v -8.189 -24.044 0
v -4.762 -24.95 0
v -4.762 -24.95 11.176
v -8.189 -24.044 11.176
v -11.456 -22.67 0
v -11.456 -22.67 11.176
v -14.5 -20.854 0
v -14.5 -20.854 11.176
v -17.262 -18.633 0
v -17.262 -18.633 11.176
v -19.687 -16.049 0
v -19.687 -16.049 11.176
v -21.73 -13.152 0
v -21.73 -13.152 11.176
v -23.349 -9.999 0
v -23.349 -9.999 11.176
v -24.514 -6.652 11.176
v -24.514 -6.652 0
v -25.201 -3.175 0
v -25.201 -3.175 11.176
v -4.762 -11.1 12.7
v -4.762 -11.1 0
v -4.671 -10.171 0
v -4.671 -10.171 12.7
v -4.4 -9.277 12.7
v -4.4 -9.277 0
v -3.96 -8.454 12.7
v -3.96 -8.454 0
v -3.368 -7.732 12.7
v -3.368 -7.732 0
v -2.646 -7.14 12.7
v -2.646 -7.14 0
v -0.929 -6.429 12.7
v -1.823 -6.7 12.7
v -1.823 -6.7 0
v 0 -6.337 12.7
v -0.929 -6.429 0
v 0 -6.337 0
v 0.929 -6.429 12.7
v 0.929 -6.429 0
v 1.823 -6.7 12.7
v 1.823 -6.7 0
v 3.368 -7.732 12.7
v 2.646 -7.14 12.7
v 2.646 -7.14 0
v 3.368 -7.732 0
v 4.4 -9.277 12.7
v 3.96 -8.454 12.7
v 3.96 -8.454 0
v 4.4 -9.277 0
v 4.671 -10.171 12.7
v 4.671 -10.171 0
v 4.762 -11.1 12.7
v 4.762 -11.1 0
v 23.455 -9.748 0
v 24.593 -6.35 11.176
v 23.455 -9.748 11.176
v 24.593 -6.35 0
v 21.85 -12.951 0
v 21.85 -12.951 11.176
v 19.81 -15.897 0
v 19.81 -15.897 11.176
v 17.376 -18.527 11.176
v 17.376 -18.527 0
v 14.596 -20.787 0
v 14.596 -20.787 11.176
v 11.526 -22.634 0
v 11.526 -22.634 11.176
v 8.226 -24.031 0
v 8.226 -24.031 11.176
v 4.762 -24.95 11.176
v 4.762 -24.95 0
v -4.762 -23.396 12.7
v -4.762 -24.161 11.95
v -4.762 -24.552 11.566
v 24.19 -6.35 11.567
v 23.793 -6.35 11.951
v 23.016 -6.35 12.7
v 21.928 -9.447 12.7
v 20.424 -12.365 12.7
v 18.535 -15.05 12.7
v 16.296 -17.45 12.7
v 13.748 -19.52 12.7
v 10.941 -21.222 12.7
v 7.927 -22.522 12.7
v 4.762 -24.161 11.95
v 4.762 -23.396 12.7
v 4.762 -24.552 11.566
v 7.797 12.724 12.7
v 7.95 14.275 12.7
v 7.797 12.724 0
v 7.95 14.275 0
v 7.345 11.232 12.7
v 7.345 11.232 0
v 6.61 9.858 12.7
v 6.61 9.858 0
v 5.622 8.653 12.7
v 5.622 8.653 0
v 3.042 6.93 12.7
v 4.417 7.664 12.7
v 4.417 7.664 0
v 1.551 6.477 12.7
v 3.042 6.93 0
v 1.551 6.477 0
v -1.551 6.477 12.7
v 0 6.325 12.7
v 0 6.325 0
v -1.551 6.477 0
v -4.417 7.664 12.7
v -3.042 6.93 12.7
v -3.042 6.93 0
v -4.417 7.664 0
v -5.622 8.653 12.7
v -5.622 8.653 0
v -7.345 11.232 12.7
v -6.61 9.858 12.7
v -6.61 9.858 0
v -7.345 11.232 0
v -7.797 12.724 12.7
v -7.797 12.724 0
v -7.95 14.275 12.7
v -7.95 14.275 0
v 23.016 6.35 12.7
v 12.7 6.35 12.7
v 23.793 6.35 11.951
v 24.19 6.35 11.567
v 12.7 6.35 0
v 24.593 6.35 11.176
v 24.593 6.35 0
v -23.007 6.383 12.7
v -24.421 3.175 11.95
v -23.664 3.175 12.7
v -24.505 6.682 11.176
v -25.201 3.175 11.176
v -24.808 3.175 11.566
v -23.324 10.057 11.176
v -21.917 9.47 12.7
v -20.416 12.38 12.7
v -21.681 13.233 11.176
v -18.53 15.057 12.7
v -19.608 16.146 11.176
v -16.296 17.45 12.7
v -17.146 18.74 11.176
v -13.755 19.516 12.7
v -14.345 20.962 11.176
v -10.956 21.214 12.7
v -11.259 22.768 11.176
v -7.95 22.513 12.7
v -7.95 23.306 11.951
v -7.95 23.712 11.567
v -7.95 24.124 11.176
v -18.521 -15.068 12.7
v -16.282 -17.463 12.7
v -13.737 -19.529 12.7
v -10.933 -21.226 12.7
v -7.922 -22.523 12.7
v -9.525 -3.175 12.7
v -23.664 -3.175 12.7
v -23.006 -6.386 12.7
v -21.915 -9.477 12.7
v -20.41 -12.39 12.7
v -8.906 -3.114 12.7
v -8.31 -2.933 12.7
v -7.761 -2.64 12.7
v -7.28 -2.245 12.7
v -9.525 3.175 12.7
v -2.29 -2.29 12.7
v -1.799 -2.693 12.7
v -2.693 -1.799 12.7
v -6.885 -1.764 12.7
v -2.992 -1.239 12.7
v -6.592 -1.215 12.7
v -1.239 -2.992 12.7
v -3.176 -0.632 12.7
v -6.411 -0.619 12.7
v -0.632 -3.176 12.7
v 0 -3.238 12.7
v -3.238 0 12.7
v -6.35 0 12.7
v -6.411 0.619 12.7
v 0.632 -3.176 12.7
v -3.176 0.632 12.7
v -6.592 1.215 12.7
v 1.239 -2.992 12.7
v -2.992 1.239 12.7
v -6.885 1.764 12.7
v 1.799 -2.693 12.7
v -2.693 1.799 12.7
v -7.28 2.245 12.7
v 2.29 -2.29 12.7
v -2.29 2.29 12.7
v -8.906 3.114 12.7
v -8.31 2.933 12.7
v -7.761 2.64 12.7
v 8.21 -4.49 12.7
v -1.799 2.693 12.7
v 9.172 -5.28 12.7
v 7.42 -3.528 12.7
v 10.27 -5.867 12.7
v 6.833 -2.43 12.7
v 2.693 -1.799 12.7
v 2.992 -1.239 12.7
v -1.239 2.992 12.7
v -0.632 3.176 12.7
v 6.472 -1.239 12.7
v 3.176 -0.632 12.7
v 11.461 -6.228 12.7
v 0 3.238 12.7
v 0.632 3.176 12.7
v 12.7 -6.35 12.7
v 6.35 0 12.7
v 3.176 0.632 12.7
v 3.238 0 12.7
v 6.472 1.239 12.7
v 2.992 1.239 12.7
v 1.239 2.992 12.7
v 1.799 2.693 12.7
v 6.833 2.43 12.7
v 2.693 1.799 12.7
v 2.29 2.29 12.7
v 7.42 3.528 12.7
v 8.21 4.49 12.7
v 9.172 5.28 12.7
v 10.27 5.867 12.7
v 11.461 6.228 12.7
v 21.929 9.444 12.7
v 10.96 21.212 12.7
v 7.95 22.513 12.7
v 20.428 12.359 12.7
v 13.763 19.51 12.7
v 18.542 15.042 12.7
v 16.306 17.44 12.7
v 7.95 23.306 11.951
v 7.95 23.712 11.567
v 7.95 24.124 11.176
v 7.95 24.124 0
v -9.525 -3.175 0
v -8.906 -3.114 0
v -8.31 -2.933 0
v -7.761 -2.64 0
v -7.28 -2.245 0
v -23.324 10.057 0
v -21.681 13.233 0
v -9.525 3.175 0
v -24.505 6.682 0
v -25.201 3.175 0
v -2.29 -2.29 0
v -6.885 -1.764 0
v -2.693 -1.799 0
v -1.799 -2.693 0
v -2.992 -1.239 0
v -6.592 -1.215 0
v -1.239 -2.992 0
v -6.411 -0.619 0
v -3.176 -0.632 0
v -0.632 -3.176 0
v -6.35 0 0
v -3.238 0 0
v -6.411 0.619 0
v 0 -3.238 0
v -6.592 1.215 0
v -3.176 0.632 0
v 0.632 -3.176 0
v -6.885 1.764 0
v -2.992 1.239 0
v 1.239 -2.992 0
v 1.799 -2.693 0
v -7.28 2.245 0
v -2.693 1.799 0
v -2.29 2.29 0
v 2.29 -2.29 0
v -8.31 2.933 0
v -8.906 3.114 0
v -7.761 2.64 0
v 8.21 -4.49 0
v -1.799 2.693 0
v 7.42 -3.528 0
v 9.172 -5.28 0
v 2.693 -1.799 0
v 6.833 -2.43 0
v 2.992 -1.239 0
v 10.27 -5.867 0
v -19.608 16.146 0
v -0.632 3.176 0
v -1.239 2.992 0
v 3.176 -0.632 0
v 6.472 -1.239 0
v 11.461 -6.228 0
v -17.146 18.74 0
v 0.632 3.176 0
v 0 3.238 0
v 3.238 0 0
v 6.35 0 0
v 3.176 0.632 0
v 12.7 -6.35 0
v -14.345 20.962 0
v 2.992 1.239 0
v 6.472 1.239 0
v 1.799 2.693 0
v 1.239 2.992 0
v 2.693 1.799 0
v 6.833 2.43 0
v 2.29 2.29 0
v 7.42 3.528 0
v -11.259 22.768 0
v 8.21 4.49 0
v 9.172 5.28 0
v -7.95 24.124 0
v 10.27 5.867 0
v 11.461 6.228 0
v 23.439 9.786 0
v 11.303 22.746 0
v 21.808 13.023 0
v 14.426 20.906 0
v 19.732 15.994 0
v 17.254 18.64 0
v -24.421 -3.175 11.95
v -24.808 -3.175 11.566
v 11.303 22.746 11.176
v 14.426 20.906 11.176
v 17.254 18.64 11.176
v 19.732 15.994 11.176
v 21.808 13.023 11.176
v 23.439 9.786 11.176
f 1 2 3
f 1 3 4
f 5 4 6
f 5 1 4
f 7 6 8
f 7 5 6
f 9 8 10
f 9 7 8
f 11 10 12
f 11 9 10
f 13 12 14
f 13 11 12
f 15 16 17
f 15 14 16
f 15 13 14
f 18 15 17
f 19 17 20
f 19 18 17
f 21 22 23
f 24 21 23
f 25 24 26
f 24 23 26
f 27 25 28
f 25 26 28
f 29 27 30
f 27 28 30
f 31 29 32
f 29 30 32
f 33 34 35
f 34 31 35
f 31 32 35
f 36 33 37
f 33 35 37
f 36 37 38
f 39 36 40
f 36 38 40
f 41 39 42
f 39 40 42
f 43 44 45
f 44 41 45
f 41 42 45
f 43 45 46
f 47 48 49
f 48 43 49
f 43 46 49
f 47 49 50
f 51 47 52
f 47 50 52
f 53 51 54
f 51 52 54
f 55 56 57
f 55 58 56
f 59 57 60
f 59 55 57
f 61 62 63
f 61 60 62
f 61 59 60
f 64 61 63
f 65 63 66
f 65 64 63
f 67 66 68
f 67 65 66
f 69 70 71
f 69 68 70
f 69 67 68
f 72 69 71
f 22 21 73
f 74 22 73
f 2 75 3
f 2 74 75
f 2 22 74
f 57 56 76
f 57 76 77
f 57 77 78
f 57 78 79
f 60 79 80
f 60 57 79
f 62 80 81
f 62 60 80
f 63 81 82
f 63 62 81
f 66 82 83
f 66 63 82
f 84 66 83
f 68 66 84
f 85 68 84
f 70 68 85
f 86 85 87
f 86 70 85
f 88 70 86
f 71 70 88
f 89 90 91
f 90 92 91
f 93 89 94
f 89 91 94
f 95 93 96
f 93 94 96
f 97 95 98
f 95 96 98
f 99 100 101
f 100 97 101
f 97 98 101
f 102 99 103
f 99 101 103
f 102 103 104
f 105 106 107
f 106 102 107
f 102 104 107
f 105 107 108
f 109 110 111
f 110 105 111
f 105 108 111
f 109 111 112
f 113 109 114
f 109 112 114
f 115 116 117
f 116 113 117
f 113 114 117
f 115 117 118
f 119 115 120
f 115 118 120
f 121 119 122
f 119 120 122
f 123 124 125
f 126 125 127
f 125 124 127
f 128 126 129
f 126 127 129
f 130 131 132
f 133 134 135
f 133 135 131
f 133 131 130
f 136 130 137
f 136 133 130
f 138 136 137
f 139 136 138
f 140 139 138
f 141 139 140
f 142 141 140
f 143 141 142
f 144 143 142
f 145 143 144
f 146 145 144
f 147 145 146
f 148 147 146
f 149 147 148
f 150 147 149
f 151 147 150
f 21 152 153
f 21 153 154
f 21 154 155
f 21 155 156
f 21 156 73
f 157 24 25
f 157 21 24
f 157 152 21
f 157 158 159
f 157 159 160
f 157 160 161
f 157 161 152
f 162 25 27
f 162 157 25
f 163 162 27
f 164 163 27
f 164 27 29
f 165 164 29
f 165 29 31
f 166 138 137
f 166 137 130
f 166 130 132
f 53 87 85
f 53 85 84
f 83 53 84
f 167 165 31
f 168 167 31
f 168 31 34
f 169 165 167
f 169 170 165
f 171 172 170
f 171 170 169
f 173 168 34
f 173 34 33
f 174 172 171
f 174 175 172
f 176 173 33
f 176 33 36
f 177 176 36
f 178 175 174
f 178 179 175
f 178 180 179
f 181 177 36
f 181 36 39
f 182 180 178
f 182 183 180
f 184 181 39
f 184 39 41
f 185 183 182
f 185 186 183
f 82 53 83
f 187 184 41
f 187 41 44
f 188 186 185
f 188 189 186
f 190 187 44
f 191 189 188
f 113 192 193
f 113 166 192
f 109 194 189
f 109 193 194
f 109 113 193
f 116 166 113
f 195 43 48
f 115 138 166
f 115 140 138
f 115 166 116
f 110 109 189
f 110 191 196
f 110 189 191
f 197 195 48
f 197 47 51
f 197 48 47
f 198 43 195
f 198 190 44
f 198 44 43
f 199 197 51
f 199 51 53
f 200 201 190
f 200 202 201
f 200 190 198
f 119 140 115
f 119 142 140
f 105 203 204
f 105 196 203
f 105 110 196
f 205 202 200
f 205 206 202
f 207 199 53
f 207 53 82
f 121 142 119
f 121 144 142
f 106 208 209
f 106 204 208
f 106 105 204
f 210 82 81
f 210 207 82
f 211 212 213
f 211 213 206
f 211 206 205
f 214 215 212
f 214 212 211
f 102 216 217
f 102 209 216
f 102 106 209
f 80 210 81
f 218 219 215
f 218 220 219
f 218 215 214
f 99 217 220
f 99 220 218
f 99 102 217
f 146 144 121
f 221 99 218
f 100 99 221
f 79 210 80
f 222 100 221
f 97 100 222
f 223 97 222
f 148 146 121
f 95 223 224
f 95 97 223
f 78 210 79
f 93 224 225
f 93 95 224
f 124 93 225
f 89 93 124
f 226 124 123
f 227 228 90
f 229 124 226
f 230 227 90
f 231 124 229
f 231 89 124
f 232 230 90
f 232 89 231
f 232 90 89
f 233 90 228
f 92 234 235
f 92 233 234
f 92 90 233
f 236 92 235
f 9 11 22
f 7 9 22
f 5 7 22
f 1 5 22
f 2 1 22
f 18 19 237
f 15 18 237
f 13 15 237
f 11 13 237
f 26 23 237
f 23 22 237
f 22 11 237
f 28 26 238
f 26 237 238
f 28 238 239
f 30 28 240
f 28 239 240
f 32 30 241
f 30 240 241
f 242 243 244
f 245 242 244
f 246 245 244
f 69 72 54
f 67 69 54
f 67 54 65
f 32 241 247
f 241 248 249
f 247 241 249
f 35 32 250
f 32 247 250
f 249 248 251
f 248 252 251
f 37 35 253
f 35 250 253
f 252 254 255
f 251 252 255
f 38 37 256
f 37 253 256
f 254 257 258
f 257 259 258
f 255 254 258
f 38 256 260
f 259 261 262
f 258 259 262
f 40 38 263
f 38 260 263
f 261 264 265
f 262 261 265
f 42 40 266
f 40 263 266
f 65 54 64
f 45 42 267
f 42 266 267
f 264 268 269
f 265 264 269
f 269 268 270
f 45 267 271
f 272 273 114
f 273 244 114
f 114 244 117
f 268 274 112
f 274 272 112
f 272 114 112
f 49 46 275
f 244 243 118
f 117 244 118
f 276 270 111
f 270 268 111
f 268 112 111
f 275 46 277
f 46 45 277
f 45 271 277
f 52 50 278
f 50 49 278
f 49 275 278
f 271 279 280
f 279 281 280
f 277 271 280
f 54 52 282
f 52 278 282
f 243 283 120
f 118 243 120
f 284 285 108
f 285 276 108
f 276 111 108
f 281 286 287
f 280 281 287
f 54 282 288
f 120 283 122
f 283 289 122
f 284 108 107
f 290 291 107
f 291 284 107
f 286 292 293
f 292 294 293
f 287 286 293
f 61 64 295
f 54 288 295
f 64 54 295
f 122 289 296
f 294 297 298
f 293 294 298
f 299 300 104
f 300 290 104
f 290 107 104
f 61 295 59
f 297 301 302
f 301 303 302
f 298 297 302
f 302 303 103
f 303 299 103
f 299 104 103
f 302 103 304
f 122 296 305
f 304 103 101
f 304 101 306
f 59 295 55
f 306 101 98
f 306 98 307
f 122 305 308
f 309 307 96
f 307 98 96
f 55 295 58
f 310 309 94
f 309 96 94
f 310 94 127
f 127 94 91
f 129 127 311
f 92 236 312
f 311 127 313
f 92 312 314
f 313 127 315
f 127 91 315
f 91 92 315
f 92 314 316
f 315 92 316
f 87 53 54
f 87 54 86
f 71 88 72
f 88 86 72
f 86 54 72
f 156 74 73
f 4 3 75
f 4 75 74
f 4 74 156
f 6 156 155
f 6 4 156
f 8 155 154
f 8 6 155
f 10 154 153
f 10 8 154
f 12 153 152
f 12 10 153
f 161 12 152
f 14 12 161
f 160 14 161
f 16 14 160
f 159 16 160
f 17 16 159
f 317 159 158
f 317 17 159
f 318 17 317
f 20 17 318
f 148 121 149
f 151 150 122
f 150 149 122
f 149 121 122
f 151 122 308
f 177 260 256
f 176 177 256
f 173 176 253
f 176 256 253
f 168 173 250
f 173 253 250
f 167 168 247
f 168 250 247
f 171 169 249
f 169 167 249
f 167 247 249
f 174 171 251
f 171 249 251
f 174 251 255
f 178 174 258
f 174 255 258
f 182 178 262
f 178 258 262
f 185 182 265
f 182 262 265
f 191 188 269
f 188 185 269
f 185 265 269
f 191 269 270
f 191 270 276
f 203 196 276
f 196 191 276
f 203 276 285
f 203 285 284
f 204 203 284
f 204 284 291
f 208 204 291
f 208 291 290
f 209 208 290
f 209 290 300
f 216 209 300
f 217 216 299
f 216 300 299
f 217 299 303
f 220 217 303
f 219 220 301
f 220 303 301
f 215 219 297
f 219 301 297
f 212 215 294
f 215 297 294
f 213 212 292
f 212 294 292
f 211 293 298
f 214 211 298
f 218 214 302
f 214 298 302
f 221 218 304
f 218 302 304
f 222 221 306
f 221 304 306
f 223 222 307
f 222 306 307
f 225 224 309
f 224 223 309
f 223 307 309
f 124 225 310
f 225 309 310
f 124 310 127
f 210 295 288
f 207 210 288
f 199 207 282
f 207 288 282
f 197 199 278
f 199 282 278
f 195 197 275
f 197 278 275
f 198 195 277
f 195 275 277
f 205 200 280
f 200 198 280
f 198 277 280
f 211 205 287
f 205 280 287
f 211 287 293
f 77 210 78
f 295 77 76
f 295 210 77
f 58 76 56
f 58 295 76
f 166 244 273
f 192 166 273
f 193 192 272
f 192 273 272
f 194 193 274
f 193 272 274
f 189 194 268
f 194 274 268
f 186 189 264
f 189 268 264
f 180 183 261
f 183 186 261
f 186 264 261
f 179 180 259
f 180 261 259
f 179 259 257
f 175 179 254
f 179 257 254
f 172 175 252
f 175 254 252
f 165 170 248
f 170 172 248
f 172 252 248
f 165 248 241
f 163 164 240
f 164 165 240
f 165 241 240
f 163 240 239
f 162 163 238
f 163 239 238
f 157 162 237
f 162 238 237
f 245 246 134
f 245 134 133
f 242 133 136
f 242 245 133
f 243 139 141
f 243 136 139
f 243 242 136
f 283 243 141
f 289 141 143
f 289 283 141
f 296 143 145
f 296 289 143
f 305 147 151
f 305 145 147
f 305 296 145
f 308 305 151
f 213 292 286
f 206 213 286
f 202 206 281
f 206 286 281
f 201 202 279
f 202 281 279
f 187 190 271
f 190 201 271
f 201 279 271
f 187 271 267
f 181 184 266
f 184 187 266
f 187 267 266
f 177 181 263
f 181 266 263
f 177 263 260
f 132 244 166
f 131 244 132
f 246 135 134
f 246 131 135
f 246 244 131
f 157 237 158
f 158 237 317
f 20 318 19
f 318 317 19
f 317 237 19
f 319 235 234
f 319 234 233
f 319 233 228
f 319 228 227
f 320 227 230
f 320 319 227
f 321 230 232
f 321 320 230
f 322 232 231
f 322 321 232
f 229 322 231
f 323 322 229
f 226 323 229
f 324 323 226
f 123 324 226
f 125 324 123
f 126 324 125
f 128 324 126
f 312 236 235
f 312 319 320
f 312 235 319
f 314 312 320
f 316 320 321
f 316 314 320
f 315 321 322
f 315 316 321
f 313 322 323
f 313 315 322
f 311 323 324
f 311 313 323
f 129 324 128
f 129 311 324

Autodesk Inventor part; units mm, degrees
ref_plane "YZ Plane" through (0, 0, 0) normal (1, 0, 0) x (0, 1, 0)
ref_plane "XZ Plane" through (0, 0, 0) normal (0, 1, 0) x (-1, 0, 0)
ref_plane "XY Plane" through (0, 0, 0) normal (0, 0, 1) x (1, 0, 0)
sketch "Sketch1" plane through (0, 0, 0) normal (0, 0, 1) x (1, 0, 0)
  line L0 (4.7625, 0) -> (6.35, 0)
  line L1 (0, -3.175) -> (0, -3.2385)
  arc A0 (12.7, 6.35) -> (12.7, -6.35) centre (12.7, 0) ccw
  arc A1 (-7.9502, 14.2748) -> (7.9502, 14.2748) centre (0, 14.2748) ccw
  arc A2 (-9.525, -3.175) -> (-9.525, 3.175) centre (-9.525, 0) ccw
  arc A3 (4.7625, -11.0998) -> (-4.7625, -11.0998) centre (0, -11.0998) ccw
  circle A4 centre (0, 0) radius 3.2385
  line L2 (7.9502, 14.2748) -> (7.9502, 24.1237)
  line L3 (-7.9502, 14.2748) -> (-7.9502, 24.1237)
  line L4 (12.7, 6.35) -> (24.5934, 6.35)
  line L5 (12.7, -6.35) -> (24.5934, -6.35)
  arc A5 (24.5934, 6.35) -> (7.9502, 24.1237) centre (0, 0) ccw
  line L6 (-9.525, 3.175) -> (-25.2008, 3.175)
  line L7 (-9.525, -3.175) -> (-25.2008, -3.175)
  arc A6 (-7.9502, 24.1237) -> (-25.2008, 3.175) centre (0, 0) ccw
  line L8 (-4.7625, -11.0998) -> (-4.7625, -24.9495)
  line L9 (4.7625, -11.0998) -> (4.7625, -24.9495)
  arc A7 (-25.2008, -3.175) -> (-4.7625, -24.9495) centre (0, 0) ccw
  arc A8 (4.7625, -24.9495) -> (24.5934, -6.35) centre (0, 0) ccw
  dimension "d5" = 6.477
  dimension "d1" = 12.7
  dimension "d2" = 15.9004
  dimension "d3" = 6.35
  dimension "d4" = 9.525
  dimension "d6" = 11.0998
  dimension "d7" = 14.2748
  dimension "d8" = 12.7
  dimension "d9" = 9.525
extrude "Extrusion1" add sketch "Sketch1" along normal blind 12.7
chamfer "Chamfer2" distance 1.524 angle 45 4 edges at (-19.6076, 16.1462, 12.7) (18.5405, 17.3612, 12.7) (17.3761, -18.5265, 12.7) (-18.5198, -17.3833, 12.7)
properties part number "Table" material "Stainless Steel"
